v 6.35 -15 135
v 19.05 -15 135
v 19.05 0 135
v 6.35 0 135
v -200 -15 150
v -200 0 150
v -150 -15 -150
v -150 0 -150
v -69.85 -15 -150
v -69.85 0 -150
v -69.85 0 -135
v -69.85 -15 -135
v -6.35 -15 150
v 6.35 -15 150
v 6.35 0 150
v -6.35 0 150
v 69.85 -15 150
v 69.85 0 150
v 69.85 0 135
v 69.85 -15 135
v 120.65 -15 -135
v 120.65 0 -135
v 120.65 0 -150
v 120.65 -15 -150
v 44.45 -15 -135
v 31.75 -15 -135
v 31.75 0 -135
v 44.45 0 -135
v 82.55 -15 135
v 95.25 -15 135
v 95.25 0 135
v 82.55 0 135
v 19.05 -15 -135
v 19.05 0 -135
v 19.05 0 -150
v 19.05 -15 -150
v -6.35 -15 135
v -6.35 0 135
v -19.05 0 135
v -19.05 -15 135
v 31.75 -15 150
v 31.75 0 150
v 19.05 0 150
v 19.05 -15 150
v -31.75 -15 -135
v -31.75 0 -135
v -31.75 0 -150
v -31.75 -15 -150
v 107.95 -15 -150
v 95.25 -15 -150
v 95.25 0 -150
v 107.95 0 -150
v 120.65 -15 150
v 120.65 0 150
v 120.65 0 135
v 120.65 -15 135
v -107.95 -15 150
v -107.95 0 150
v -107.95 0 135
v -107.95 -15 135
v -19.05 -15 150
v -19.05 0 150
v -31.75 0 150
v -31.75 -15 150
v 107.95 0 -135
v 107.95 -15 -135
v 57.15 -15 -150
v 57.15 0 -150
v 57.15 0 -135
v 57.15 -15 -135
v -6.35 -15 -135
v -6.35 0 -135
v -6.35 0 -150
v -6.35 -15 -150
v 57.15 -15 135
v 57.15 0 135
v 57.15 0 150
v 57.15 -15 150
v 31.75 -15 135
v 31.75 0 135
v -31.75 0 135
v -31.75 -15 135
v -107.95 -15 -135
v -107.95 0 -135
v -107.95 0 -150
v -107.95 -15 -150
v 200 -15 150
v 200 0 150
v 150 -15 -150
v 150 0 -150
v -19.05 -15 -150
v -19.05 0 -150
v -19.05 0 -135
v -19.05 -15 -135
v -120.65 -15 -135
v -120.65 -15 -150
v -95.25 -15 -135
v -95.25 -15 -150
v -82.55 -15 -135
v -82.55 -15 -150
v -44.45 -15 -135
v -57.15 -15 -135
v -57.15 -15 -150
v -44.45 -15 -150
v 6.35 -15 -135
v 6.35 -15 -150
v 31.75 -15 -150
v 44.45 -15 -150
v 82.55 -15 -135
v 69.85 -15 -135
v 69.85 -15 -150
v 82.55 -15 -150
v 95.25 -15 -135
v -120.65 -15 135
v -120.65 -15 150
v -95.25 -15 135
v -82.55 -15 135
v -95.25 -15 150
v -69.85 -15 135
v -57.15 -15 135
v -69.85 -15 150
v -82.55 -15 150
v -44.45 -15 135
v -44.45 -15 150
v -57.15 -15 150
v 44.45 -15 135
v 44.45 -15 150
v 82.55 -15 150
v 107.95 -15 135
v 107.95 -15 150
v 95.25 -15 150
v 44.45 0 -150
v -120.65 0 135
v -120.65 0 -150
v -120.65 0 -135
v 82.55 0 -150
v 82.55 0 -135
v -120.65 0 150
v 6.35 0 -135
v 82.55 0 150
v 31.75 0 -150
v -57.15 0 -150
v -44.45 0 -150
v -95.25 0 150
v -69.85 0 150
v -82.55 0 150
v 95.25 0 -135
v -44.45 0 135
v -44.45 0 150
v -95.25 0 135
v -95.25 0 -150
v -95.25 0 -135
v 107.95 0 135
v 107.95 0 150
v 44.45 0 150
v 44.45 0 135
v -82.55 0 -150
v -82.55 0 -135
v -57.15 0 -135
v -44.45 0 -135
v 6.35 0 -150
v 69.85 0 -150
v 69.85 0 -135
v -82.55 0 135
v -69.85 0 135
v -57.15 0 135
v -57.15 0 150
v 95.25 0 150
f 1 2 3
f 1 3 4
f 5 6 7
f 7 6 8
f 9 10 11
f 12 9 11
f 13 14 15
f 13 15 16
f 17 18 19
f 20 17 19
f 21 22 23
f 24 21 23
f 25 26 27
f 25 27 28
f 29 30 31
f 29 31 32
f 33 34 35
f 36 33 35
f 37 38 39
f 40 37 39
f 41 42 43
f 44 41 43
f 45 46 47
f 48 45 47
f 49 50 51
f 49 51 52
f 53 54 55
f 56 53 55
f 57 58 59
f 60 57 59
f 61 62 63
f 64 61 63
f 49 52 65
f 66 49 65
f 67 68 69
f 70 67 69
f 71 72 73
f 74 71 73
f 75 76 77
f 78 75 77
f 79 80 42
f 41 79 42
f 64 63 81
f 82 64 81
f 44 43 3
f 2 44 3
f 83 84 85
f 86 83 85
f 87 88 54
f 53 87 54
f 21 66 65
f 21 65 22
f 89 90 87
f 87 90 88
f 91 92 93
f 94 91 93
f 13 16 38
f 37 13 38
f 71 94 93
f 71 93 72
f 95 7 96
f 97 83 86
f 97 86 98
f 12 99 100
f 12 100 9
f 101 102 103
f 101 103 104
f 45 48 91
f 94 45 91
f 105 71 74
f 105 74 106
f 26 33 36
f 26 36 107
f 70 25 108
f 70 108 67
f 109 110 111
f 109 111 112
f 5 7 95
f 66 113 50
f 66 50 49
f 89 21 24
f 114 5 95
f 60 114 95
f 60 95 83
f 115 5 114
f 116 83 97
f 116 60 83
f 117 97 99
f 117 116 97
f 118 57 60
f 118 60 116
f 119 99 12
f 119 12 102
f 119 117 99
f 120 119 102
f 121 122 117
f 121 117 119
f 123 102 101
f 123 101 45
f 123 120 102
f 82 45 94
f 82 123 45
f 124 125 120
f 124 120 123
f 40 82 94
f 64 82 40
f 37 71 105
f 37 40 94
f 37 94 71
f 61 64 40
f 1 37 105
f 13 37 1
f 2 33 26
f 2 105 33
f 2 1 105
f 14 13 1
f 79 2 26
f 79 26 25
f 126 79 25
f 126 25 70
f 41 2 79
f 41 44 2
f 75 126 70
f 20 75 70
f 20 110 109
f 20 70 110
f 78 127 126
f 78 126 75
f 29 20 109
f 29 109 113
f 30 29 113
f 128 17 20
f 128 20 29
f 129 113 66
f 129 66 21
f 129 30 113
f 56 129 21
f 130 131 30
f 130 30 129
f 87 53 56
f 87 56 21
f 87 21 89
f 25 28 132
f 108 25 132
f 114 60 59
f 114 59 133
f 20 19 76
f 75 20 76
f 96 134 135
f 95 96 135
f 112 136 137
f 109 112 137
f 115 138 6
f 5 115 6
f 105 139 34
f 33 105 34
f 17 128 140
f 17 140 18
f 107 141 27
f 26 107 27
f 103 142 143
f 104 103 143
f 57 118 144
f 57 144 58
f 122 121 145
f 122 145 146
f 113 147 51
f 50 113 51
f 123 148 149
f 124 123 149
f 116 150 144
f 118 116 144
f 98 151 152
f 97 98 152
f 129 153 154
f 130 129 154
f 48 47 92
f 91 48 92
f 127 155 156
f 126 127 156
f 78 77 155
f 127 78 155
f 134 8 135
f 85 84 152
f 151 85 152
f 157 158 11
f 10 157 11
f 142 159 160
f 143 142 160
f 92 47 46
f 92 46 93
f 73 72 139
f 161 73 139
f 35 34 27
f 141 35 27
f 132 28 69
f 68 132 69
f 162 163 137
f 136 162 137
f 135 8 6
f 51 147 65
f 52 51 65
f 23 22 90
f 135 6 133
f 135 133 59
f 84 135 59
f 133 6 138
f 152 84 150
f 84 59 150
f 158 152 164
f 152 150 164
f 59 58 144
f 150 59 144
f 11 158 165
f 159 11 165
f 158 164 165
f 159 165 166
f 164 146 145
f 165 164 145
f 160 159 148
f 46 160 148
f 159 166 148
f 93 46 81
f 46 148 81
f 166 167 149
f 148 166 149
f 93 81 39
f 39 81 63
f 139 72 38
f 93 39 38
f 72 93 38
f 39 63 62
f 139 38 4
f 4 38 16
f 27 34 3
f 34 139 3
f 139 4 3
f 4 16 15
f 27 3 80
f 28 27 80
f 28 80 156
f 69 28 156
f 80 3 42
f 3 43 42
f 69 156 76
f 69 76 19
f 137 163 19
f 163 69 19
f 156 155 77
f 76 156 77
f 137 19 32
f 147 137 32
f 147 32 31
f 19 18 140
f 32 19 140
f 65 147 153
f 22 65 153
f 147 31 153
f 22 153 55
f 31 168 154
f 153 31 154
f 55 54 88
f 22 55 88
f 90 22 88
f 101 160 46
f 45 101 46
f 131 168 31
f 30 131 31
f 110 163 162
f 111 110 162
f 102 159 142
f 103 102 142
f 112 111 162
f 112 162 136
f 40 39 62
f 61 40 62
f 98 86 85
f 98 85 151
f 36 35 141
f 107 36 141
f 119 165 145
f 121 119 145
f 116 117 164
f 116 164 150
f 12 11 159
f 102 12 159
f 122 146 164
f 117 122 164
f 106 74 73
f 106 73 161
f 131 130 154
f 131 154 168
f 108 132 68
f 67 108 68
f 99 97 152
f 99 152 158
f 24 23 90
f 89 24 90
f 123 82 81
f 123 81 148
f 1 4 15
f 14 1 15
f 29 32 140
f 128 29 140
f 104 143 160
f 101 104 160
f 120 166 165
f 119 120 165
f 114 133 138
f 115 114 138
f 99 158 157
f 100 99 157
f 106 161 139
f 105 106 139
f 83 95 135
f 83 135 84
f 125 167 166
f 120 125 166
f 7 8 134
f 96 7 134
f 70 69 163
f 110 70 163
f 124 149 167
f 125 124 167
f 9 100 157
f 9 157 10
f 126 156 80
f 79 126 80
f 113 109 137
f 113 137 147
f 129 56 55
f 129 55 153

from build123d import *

# Parameters (mm, degrees)
F1_DEPTH = 15


# Not quite as in the source:
# - a feature names something its author has since deleted; it is built from what else it names


with BuildPart() as f1:
    # F0 (on Front) → F1 (new body)
    with BuildSketch(Plane.XZ):
        Polygon((150, -150), (200, 150), (120.65, 150), (120.65, 135), (107.95, 135), (107.95, 150), (95.25, 150), (95.25, 135), (82.55, 135), (82.55, 150), (69.85, 150), (69.85, 135), (57.15, 135), (57.15, 150), (44.45, 150), (44.45, 135), (31.75, 135), (31.75, 150), (19.05, 150), (19.05, 135), (6.35, 135), (6.35, 150), (0, 150), (-6.35, 150), (-6.35, 135), (-19.05, 135), (-19.05, 150), (-31.75, 150), (-31.75, 135), (-44.45, 135), (-44.45, 150), (-57.15, 150), (-57.15, 135), (-69.85, 135), (-69.85, 150), (-82.55, 150), (-82.55, 135), (-95.25, 135), (-95.25, 150), (-107.95, 150), (-107.95, 135), (-120.65, 135), (-120.65, 150), (-200, 150), (-150, -150), (-120.65, -150), (-120.65, -135), (-107.95, -135), (-107.95, -150), (-95.25, -150), (-95.25, -135), (-82.55, -135), (-82.55, -150), (-69.85, -150), (-69.85, -135), (-57.15, -135), (-57.15, -150), (-44.45, -150), (-44.45, -135), (-31.75, -135), (-31.75, -150), (-19.05, -150), (-19.05, -135), (-6.35, -135), (-6.35, -150), (0, -150), (6.35, -150), (6.35, -135), (19.05, -135), (19.05, -150), (31.75, -150), (31.75, -135), (44.45, -135), (44.45, -150), (57.15, -150), (57.15, -135), (69.85, -135), (69.85, -150), (82.55, -150), (82.55, -135), (95.25, -135), (95.25, -150), (107.95, -150), (107.95, -135), (120.65, -135), (120.65, -150), align=None)
    extrude(amount=F1_DEPTH)


solid = f1.part
